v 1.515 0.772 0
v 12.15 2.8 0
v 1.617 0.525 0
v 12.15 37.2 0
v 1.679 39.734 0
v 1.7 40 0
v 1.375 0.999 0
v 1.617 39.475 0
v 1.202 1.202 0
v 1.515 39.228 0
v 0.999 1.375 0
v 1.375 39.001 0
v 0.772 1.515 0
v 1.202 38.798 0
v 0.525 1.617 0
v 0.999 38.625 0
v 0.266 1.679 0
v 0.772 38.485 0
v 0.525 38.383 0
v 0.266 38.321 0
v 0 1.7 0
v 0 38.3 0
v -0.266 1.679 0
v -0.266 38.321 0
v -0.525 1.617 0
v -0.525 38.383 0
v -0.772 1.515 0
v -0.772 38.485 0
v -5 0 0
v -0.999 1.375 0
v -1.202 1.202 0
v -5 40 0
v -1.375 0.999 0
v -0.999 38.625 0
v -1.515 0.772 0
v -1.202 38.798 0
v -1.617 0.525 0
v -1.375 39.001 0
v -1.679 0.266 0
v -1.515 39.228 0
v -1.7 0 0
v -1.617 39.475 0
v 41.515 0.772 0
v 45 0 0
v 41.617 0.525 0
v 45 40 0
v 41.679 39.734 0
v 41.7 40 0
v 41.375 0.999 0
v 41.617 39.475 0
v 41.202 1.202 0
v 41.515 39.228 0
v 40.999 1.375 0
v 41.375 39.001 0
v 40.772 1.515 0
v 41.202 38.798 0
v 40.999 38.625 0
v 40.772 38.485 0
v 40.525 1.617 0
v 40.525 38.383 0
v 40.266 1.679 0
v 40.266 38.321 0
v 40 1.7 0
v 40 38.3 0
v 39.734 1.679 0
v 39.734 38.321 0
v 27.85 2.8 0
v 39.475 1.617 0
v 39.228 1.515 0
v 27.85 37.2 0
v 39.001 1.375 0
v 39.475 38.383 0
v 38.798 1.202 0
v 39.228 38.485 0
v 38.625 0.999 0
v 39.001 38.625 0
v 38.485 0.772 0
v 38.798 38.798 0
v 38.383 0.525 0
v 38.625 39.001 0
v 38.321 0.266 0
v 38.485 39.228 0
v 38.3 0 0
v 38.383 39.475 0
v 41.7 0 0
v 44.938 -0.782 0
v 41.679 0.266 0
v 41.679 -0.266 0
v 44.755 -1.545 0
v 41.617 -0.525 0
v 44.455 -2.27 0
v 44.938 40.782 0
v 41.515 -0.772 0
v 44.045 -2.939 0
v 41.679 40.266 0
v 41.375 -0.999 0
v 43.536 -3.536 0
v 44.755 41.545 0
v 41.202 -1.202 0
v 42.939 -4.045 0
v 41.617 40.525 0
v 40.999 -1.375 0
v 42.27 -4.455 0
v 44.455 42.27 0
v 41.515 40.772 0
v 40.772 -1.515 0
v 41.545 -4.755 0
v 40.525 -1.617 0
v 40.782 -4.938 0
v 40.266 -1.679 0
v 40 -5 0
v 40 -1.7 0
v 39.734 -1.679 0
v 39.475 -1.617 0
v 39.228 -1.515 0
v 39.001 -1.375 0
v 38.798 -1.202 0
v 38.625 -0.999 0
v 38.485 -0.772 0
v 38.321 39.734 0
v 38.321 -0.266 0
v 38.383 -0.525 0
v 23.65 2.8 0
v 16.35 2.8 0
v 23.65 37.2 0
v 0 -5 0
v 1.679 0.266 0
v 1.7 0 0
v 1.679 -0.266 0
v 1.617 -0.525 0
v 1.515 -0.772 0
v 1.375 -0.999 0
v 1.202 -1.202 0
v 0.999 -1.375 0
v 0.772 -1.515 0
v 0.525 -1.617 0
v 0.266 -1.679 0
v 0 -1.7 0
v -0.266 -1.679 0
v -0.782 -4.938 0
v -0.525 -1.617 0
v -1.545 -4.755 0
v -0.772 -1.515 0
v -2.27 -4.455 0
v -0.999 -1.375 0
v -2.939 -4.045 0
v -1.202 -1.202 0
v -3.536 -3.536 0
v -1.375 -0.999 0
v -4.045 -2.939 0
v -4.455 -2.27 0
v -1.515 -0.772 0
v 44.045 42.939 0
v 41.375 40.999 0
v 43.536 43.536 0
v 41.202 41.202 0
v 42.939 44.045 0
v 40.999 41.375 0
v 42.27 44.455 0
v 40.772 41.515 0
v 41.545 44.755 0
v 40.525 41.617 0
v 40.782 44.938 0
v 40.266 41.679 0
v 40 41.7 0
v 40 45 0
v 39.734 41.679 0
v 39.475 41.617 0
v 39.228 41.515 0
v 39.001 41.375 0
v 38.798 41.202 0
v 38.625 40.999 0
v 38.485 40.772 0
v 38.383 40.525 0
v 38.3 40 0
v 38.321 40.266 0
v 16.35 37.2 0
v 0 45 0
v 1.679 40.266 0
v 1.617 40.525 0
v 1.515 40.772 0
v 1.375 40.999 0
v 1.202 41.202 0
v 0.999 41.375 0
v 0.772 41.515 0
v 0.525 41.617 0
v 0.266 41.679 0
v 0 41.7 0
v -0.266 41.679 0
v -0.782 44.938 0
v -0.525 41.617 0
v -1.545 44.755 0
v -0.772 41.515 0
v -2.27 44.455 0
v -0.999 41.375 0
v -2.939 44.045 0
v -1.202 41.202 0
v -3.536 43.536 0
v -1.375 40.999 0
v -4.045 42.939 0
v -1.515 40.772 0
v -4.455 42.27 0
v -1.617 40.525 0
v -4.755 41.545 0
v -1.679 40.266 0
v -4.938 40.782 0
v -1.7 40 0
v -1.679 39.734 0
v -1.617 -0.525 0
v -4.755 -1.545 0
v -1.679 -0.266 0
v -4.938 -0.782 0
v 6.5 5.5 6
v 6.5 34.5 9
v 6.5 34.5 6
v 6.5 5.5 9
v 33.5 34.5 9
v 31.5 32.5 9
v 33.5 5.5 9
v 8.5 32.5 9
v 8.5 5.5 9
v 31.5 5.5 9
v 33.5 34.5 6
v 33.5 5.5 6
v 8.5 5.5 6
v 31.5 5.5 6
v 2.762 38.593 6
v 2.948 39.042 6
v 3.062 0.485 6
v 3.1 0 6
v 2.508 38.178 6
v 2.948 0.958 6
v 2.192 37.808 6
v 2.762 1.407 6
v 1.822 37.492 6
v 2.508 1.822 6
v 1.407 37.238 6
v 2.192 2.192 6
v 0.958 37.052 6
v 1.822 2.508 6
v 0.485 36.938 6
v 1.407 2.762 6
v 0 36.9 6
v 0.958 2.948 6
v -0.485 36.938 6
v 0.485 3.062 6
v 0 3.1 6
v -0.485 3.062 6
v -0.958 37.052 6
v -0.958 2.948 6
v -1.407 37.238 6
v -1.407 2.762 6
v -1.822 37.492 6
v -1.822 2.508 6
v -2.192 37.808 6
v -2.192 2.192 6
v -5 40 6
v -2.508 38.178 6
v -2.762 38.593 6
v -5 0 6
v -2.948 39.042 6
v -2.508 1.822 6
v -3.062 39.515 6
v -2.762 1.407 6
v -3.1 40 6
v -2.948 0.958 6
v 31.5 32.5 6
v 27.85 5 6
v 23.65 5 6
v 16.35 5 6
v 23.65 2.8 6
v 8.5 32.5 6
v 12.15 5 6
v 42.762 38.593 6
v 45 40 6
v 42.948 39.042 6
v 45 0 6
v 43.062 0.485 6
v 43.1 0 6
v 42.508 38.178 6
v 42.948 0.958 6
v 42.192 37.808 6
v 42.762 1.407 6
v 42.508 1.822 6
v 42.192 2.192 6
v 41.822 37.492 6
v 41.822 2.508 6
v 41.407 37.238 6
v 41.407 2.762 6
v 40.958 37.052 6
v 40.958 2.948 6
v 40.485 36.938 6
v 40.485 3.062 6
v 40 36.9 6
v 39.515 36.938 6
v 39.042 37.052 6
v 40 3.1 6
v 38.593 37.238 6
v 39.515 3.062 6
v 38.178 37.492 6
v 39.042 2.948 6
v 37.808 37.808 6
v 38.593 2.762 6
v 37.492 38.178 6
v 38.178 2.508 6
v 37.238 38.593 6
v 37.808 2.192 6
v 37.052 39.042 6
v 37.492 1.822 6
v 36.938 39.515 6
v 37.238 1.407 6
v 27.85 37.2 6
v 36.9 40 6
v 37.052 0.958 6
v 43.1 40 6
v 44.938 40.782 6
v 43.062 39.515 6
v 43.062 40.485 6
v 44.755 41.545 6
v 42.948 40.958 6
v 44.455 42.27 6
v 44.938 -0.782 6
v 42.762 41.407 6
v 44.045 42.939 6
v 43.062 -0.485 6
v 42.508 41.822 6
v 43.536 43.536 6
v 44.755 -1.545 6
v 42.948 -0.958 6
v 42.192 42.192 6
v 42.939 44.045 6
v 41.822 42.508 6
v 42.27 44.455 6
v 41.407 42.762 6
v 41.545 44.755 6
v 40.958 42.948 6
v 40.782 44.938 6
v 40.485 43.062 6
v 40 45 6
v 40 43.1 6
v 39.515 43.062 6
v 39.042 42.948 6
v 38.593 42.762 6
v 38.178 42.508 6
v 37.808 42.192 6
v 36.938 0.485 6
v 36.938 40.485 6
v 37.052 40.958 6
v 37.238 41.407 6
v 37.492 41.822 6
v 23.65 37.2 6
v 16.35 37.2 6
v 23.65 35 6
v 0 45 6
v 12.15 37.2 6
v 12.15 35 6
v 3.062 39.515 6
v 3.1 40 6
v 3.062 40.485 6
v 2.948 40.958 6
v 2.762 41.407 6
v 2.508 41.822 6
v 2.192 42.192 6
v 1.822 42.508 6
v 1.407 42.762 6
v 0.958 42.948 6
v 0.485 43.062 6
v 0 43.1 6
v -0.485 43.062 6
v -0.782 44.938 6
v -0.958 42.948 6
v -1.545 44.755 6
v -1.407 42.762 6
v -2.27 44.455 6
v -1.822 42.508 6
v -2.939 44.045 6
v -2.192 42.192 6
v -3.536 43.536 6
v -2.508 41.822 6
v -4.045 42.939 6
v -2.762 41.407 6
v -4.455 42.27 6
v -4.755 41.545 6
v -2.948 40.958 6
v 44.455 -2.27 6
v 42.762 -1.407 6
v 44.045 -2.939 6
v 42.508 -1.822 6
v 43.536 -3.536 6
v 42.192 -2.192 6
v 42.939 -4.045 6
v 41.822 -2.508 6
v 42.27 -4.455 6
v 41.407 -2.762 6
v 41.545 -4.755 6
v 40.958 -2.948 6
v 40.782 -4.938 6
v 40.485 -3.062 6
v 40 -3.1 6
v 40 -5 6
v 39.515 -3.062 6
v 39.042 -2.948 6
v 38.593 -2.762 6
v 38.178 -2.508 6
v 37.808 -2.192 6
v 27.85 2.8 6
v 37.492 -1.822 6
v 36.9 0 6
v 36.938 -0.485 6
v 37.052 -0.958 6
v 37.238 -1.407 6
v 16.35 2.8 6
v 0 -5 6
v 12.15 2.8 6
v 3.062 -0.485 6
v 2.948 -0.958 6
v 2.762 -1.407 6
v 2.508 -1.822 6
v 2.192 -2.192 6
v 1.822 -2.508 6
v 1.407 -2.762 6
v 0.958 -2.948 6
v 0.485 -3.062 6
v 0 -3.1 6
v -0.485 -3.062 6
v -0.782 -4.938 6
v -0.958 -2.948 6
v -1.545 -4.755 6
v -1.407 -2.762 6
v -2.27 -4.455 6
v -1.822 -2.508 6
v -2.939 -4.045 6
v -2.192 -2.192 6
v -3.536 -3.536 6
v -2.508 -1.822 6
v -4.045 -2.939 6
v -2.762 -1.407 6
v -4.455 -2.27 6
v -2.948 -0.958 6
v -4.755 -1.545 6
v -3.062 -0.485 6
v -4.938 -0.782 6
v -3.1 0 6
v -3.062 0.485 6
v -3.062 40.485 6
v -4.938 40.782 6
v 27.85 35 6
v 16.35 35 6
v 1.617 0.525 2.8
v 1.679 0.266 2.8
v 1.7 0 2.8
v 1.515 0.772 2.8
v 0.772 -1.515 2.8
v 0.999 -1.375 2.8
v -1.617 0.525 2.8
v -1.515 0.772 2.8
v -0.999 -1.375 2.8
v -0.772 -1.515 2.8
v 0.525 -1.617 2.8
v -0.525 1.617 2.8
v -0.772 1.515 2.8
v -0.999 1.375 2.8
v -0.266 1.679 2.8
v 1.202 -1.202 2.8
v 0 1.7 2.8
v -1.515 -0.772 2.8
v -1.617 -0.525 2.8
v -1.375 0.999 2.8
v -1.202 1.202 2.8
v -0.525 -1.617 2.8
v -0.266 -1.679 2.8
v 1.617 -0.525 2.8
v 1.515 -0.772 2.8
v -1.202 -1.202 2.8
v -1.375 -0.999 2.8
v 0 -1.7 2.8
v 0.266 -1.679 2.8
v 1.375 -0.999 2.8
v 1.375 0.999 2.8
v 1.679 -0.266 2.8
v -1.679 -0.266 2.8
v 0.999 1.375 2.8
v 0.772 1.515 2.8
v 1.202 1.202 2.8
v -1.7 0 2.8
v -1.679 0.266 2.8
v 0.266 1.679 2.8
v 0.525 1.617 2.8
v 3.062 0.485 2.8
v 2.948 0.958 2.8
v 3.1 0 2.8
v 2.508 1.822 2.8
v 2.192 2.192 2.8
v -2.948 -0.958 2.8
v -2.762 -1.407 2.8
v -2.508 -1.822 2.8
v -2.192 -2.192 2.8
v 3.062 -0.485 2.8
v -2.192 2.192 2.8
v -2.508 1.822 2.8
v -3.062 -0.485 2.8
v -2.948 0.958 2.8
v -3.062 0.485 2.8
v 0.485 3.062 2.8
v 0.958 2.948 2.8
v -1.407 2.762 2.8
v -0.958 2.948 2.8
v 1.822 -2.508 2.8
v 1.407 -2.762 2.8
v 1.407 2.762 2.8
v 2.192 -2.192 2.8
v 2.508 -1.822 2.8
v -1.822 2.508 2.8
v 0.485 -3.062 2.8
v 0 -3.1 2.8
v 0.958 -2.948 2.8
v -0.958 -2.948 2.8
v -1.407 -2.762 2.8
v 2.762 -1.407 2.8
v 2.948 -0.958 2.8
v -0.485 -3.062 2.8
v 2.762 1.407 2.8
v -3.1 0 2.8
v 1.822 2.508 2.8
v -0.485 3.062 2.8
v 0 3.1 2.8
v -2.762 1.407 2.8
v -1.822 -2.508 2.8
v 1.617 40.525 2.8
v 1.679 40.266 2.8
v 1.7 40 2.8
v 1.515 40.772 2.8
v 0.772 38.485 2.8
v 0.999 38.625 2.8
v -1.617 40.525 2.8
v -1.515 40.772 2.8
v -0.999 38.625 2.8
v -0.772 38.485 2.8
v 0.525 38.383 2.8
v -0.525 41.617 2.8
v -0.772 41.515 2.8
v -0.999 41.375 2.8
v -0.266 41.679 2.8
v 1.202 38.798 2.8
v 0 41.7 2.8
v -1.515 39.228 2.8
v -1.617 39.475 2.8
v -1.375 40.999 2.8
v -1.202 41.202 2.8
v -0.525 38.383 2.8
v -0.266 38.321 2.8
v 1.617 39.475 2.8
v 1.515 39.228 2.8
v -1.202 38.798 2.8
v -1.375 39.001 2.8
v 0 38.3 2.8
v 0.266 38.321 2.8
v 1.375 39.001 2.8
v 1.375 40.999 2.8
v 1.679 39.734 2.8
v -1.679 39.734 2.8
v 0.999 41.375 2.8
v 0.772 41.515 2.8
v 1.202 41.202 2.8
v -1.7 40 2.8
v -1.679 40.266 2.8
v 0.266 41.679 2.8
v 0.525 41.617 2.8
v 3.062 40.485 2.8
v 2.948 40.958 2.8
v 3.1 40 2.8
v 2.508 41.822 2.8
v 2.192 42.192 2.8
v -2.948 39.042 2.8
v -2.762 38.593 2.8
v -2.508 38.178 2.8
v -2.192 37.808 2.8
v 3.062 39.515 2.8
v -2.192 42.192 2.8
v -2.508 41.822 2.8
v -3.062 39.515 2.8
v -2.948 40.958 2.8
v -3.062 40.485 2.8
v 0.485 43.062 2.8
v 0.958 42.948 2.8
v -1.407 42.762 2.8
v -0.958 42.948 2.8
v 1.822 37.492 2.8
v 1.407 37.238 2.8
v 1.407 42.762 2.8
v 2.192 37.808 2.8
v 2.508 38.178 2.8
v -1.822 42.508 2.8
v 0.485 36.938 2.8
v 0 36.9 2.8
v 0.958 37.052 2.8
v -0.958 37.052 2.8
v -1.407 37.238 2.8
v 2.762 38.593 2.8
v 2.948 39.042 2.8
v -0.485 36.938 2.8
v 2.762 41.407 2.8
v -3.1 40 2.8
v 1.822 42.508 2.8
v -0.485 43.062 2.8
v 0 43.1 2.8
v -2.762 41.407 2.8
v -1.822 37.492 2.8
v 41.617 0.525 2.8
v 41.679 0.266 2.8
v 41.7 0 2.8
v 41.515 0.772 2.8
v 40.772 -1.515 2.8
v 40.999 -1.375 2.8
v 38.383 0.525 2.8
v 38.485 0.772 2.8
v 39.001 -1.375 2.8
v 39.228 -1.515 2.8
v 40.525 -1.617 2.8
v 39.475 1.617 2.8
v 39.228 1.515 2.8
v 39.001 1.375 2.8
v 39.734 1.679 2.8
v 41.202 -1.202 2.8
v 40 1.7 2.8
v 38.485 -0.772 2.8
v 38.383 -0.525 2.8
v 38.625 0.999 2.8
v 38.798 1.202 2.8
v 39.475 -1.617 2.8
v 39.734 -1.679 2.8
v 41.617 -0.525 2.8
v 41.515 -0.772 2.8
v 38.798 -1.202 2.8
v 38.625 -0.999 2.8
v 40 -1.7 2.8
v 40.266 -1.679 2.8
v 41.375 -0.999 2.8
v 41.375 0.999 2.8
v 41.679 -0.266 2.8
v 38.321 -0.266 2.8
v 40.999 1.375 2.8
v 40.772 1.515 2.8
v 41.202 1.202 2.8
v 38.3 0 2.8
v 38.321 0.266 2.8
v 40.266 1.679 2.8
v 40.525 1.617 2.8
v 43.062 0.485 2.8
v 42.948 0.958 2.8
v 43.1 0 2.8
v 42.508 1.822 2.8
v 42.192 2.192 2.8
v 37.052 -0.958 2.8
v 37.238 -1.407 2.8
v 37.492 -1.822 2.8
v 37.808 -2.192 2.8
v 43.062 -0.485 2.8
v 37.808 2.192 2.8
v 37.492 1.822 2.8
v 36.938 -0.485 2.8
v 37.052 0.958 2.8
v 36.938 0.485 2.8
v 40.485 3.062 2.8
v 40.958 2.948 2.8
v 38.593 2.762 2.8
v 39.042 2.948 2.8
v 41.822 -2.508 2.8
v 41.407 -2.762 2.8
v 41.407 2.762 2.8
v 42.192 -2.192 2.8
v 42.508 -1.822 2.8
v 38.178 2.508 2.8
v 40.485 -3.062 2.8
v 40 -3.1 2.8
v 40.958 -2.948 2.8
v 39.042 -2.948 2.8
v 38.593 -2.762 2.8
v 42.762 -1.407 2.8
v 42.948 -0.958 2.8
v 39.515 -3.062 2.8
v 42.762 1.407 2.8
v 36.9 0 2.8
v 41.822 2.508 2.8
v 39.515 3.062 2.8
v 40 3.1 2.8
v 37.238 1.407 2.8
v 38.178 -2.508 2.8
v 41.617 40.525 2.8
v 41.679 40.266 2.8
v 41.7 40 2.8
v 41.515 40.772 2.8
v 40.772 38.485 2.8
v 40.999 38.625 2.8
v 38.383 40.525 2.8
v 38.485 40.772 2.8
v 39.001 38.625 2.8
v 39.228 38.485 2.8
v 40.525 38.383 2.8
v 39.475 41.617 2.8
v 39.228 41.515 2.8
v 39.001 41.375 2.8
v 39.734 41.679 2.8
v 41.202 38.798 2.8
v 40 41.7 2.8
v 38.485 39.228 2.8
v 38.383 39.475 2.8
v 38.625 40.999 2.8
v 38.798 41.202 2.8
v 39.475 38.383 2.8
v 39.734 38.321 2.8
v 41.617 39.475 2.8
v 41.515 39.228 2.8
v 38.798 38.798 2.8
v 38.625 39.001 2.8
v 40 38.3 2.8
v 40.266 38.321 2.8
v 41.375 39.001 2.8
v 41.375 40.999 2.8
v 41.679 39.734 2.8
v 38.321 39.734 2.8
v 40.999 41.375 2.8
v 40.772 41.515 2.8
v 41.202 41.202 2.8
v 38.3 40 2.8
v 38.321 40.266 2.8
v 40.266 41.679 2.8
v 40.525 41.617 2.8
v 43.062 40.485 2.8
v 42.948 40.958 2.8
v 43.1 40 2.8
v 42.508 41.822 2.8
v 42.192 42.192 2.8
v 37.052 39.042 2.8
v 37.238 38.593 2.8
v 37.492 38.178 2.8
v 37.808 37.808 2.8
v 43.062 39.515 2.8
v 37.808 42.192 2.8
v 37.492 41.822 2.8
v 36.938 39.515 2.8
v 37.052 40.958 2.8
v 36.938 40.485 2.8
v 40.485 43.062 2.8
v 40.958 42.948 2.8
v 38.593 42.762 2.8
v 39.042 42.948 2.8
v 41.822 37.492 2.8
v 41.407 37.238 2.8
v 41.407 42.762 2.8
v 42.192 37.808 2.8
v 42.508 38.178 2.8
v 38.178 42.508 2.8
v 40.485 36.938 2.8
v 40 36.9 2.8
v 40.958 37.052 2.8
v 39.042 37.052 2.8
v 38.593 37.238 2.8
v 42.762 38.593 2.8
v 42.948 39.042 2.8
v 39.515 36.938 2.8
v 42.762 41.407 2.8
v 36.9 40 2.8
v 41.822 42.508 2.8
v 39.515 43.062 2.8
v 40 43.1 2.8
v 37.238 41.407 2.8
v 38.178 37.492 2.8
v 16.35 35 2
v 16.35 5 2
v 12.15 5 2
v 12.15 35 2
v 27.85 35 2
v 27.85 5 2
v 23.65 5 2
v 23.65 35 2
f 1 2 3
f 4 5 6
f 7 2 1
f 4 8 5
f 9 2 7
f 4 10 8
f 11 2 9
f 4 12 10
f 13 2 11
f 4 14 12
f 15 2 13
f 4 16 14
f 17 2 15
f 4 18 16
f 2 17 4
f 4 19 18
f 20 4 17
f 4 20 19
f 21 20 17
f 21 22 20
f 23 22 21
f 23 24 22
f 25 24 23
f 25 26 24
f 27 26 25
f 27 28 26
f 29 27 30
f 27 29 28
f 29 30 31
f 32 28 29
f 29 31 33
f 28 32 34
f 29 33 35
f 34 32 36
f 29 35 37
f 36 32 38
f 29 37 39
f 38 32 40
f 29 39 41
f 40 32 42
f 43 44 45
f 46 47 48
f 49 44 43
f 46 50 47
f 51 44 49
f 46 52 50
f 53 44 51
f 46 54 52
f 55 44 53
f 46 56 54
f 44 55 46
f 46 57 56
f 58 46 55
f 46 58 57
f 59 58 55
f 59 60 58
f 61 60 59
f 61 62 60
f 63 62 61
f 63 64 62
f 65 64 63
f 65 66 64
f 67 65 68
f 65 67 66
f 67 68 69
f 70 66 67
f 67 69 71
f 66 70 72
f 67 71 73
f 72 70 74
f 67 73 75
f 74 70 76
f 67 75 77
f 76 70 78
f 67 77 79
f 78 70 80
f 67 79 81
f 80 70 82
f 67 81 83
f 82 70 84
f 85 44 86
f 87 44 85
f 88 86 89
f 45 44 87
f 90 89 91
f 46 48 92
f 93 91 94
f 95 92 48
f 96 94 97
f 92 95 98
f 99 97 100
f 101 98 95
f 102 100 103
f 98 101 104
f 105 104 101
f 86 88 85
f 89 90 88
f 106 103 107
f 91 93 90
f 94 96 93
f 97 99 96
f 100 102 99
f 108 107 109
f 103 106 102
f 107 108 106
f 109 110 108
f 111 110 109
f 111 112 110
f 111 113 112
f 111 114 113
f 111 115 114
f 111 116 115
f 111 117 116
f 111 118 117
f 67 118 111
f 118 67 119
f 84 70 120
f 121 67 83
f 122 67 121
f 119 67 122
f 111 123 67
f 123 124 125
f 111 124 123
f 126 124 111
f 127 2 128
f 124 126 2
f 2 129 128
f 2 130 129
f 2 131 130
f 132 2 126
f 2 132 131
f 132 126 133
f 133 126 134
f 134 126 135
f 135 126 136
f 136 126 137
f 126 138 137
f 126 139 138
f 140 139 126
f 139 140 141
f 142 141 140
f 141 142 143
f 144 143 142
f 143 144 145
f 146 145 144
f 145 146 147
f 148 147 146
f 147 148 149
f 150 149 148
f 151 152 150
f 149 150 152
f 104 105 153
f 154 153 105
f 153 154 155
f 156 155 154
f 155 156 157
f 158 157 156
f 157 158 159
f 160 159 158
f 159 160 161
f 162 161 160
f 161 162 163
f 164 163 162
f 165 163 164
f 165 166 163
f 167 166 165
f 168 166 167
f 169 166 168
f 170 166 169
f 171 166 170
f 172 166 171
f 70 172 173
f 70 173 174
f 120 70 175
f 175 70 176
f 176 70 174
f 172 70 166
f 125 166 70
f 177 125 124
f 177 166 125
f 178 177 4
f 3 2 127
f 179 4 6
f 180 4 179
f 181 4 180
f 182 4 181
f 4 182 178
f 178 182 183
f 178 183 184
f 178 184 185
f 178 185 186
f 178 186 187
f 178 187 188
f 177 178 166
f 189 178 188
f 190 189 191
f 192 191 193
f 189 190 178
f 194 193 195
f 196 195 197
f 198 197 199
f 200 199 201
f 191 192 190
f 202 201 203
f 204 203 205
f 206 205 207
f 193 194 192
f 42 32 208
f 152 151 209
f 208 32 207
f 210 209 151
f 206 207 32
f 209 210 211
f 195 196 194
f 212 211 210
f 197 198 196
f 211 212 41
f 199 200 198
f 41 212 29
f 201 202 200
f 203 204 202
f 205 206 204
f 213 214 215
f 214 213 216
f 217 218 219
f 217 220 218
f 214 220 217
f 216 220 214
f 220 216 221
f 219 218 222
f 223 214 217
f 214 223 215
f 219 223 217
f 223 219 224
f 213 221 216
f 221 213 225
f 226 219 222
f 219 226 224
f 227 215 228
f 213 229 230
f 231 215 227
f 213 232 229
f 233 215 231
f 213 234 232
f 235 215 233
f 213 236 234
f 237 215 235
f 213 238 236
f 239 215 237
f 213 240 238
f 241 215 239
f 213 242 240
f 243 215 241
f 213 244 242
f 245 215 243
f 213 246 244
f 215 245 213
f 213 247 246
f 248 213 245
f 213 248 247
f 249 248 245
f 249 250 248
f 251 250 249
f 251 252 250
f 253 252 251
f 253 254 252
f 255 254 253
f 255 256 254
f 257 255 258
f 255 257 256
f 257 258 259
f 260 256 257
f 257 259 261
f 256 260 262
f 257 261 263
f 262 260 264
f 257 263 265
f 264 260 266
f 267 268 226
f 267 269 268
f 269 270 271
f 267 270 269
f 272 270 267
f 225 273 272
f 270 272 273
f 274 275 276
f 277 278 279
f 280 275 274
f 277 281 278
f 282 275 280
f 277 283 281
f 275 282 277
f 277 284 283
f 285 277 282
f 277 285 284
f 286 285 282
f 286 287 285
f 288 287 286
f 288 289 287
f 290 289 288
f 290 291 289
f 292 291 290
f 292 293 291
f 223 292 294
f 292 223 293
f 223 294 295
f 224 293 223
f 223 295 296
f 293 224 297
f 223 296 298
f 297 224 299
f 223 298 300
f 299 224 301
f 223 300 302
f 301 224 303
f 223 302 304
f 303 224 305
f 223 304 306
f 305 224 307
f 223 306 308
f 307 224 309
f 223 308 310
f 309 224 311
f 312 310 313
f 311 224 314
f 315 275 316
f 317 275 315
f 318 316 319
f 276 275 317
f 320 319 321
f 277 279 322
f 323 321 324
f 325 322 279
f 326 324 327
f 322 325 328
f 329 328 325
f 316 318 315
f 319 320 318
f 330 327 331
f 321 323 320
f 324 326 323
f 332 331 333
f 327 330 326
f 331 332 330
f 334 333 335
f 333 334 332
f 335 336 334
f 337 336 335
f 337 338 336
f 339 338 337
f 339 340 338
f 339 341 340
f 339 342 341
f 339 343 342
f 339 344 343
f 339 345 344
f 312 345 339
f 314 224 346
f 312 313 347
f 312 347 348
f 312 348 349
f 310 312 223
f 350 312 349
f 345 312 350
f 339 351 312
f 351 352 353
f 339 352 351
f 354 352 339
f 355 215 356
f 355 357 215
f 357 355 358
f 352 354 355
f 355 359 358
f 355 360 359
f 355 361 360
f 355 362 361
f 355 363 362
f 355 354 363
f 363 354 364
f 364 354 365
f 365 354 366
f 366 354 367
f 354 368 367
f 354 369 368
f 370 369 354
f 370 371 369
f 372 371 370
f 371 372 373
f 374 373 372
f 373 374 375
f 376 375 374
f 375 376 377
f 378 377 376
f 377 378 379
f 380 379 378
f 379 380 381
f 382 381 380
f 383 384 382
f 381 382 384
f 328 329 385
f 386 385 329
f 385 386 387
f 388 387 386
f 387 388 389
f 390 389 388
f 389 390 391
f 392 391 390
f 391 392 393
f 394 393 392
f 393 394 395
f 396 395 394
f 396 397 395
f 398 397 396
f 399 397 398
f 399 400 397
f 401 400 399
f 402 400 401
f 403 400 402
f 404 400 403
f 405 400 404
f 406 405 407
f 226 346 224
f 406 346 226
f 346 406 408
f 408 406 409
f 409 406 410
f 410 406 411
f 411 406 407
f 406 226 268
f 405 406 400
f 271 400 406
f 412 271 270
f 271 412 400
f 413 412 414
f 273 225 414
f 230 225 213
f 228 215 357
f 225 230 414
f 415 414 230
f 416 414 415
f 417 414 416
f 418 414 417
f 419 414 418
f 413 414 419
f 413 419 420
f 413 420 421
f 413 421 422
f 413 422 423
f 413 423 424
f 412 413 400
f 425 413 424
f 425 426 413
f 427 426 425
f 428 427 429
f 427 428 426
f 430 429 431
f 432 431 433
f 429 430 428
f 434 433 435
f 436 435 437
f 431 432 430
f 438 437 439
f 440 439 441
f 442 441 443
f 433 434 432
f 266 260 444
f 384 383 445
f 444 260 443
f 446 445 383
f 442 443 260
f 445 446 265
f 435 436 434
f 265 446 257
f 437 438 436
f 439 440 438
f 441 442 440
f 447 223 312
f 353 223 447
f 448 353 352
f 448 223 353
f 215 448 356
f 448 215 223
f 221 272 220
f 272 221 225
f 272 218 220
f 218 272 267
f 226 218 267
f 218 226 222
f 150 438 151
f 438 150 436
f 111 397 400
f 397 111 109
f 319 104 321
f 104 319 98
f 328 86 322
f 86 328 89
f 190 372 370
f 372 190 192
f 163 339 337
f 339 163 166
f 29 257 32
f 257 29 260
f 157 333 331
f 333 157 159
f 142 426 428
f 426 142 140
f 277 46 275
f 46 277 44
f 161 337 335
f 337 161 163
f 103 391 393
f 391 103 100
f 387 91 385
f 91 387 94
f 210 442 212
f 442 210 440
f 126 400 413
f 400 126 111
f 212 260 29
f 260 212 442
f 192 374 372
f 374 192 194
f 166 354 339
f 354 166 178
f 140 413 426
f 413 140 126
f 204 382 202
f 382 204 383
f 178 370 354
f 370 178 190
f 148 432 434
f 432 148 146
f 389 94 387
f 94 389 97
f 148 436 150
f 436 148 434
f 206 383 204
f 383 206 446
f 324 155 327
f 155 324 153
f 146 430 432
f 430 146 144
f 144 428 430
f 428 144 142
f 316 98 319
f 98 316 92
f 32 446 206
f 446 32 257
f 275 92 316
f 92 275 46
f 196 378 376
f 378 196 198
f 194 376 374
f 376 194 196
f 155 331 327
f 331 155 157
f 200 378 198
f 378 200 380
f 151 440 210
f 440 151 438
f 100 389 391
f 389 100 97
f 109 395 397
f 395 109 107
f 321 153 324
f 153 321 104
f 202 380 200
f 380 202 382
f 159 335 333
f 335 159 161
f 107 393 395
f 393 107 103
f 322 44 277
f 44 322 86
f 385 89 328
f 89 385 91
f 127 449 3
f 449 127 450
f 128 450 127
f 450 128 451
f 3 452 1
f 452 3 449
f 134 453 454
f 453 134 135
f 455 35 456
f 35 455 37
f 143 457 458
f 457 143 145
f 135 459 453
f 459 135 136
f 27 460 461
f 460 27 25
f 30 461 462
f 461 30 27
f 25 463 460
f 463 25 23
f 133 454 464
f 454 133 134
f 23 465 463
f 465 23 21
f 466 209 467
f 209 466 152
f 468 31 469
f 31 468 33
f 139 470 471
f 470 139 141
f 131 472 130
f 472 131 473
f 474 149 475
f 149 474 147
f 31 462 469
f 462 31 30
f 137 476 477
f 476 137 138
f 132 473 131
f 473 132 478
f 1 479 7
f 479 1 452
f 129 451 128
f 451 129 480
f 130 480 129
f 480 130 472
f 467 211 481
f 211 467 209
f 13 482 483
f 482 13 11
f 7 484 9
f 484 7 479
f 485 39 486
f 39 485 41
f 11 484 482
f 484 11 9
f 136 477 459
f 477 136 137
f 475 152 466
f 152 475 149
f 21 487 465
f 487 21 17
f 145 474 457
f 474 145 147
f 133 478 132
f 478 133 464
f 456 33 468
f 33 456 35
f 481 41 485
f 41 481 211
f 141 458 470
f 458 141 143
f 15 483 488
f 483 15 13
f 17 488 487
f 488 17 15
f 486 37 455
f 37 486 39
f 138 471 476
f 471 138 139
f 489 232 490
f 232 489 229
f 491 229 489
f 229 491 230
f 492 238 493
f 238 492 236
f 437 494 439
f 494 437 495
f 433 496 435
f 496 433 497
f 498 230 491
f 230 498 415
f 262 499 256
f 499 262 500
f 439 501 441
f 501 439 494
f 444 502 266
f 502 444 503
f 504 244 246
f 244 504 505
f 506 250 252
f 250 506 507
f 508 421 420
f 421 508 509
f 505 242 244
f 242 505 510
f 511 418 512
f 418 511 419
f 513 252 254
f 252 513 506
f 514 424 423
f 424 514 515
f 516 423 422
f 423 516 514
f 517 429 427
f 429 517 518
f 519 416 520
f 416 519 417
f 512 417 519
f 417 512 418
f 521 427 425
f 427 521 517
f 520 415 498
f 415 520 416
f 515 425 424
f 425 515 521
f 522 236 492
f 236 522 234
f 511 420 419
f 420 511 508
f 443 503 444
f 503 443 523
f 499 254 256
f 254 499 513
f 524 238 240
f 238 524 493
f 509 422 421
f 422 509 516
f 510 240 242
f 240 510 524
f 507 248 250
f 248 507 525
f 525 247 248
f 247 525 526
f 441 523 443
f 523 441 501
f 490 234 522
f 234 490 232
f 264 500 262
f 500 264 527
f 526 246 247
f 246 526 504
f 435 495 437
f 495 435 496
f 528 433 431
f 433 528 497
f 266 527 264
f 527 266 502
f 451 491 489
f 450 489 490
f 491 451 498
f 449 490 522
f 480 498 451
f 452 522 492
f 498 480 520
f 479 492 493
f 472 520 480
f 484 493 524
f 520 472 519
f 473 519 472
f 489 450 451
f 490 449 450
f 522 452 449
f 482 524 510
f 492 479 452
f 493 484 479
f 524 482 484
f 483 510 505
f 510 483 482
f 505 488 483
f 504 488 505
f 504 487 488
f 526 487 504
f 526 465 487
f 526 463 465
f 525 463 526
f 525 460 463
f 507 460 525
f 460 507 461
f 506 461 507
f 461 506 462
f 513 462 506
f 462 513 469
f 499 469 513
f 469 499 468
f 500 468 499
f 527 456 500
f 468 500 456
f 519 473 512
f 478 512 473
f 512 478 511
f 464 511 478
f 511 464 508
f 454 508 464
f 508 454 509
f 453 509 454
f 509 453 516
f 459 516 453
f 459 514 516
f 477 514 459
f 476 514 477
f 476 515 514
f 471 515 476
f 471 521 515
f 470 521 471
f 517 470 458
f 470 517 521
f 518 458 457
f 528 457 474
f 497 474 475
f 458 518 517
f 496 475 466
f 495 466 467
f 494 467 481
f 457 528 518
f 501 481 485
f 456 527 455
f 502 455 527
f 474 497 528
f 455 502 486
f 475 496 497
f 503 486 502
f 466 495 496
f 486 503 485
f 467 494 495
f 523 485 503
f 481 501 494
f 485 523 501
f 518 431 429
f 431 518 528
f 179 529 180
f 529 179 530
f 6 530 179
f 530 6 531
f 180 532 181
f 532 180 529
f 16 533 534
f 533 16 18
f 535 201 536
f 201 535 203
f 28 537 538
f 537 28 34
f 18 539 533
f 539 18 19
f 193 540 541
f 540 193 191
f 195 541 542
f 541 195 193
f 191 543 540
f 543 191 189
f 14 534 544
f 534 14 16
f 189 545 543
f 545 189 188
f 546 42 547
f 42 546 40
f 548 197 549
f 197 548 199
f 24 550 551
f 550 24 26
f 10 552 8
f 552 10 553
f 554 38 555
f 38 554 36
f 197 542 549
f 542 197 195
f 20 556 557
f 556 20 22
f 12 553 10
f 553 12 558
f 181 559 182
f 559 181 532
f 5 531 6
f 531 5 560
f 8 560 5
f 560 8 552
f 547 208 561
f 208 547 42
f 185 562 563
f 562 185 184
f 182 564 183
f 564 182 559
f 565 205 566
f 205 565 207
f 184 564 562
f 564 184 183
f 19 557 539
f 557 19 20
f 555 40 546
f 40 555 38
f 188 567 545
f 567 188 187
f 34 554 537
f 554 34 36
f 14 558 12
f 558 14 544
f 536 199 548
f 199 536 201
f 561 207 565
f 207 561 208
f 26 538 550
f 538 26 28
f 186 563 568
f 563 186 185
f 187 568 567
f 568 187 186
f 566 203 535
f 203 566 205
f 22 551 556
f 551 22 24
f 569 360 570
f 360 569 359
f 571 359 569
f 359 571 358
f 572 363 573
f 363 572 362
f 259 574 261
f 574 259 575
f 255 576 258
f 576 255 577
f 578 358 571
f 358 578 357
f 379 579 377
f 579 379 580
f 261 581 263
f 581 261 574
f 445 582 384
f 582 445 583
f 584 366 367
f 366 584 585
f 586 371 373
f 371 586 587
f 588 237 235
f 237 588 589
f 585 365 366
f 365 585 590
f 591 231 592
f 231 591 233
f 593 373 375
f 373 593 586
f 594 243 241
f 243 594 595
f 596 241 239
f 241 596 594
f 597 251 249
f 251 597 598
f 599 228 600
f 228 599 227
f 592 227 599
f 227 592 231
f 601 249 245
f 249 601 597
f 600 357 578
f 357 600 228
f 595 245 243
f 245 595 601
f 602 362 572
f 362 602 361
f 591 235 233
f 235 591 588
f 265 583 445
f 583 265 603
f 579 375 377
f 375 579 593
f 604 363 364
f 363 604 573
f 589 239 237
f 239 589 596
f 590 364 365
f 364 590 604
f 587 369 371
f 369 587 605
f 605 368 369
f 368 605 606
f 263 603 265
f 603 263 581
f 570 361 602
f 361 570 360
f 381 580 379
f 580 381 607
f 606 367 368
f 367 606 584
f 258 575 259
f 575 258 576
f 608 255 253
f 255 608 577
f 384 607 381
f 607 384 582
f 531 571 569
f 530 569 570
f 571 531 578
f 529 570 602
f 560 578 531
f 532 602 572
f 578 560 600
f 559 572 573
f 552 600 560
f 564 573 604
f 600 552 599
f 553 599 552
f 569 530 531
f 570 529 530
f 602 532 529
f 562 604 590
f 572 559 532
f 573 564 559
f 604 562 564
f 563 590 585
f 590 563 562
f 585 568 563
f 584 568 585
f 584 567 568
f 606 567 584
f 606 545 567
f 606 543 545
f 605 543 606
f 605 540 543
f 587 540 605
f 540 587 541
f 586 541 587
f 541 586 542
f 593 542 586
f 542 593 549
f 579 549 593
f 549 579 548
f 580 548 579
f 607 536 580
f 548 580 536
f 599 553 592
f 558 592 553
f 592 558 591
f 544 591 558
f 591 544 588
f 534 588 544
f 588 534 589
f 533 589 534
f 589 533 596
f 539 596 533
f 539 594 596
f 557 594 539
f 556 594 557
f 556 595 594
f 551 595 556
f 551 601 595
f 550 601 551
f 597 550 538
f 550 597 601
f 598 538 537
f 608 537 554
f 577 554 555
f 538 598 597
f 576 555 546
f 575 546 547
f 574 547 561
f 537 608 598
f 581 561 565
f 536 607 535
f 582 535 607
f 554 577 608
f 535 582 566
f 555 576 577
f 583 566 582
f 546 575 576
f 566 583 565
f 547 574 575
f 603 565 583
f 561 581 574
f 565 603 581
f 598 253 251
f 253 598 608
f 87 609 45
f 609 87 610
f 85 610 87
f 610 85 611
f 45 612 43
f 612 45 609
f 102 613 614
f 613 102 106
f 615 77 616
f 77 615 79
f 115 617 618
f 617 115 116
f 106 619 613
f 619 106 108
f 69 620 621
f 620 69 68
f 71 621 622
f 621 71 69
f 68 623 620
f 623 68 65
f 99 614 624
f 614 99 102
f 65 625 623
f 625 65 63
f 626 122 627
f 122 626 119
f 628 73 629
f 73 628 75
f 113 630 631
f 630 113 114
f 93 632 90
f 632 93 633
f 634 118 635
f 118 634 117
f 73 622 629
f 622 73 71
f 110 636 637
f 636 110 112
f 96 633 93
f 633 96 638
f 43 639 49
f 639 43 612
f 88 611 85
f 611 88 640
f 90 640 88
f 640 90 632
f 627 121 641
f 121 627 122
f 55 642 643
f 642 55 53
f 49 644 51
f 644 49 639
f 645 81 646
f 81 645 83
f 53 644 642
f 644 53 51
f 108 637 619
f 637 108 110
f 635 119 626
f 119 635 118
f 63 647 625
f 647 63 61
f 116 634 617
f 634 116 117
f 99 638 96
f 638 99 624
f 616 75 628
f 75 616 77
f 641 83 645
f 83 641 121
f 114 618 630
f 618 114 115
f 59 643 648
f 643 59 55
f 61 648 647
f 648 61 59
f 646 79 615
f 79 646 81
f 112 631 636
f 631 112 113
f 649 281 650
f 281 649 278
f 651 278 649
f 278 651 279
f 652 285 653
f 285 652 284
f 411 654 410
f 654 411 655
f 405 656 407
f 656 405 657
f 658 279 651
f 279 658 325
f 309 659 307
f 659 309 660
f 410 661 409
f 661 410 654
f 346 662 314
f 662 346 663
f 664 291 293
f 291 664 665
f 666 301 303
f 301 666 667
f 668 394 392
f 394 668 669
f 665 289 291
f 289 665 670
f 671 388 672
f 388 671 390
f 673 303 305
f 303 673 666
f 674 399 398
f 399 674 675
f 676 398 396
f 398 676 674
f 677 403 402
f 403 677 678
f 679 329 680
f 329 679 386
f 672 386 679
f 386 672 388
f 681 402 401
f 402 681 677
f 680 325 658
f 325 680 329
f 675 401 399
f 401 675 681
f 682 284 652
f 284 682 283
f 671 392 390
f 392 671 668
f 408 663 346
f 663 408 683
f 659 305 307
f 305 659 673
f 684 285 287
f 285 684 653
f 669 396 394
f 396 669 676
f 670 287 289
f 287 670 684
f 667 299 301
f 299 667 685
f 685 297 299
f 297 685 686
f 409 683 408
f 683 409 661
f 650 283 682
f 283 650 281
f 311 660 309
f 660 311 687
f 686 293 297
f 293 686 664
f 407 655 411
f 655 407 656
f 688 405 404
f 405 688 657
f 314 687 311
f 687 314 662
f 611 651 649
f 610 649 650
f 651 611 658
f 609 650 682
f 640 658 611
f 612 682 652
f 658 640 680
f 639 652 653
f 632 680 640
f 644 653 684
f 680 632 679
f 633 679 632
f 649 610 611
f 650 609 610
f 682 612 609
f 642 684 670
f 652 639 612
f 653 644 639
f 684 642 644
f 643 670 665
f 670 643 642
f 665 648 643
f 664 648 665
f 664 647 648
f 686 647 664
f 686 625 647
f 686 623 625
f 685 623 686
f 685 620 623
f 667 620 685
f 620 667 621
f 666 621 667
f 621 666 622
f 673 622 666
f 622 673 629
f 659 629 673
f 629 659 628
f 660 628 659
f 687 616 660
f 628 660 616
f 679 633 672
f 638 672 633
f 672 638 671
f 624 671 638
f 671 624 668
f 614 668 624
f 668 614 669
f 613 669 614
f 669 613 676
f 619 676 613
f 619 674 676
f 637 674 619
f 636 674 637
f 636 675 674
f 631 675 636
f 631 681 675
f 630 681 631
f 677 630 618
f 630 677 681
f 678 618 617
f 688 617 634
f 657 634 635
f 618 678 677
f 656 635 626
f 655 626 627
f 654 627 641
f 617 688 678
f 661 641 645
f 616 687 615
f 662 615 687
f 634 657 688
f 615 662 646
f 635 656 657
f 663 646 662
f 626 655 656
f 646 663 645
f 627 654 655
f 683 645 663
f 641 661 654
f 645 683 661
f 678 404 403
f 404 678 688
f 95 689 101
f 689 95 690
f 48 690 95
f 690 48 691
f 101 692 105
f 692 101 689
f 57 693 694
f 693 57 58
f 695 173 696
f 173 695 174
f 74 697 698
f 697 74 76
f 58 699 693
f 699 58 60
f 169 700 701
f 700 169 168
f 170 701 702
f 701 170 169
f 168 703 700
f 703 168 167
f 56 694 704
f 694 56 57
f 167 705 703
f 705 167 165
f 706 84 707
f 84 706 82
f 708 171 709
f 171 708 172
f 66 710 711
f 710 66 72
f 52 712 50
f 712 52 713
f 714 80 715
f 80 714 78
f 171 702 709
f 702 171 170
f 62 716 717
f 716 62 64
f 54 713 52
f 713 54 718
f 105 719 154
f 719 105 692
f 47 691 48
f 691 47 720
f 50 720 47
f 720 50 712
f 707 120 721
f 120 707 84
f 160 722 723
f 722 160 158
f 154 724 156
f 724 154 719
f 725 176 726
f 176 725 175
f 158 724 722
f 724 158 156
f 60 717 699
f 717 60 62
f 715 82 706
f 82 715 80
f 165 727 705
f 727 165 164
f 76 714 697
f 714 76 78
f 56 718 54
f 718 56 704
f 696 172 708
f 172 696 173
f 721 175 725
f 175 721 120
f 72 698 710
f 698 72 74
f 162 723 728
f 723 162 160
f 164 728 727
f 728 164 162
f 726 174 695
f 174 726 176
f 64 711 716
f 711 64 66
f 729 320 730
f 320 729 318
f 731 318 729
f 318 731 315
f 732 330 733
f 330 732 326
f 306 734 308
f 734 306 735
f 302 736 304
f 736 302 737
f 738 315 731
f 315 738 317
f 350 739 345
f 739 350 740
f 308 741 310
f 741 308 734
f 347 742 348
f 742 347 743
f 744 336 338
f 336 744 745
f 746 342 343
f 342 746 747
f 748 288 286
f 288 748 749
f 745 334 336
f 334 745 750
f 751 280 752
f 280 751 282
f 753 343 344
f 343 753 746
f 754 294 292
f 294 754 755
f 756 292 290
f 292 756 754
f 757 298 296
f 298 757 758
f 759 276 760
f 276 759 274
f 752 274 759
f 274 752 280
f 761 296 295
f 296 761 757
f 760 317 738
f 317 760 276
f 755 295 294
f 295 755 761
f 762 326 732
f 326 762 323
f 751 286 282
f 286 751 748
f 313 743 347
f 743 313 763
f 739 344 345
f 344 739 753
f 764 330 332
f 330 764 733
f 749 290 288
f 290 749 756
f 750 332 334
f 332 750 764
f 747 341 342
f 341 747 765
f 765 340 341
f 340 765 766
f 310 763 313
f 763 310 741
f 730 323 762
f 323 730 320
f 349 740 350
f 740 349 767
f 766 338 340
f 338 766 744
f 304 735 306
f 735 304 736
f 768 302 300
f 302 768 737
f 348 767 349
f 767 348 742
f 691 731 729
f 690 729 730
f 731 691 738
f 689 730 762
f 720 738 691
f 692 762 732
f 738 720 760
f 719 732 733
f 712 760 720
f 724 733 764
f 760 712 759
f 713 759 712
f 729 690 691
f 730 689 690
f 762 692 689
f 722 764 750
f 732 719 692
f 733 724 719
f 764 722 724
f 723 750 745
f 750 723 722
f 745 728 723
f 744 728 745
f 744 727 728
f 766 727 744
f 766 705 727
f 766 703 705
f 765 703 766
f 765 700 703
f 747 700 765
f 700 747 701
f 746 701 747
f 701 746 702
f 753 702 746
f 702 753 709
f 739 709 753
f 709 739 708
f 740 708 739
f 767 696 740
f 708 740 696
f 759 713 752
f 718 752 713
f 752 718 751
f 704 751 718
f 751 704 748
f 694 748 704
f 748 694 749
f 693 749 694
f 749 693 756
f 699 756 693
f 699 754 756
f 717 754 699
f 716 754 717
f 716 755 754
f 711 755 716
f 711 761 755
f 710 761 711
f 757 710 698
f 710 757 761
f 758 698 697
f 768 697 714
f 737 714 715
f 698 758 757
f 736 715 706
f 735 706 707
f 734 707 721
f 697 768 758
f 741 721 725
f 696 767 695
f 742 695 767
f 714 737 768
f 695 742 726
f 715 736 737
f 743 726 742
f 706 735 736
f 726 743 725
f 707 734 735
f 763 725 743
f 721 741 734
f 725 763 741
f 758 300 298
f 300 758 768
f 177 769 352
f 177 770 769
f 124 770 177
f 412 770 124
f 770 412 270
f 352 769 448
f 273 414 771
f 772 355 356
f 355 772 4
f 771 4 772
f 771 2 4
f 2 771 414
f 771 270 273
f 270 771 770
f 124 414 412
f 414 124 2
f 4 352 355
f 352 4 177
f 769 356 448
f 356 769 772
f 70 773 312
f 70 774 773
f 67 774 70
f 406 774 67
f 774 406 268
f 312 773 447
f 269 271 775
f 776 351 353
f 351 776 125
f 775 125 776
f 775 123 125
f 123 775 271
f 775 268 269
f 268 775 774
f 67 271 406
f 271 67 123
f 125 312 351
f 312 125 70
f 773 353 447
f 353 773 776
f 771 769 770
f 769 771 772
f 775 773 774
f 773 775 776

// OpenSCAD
include <../lib/apache-case-modules-lib.scad>;
$fn = 40;
kit_tray_print();
